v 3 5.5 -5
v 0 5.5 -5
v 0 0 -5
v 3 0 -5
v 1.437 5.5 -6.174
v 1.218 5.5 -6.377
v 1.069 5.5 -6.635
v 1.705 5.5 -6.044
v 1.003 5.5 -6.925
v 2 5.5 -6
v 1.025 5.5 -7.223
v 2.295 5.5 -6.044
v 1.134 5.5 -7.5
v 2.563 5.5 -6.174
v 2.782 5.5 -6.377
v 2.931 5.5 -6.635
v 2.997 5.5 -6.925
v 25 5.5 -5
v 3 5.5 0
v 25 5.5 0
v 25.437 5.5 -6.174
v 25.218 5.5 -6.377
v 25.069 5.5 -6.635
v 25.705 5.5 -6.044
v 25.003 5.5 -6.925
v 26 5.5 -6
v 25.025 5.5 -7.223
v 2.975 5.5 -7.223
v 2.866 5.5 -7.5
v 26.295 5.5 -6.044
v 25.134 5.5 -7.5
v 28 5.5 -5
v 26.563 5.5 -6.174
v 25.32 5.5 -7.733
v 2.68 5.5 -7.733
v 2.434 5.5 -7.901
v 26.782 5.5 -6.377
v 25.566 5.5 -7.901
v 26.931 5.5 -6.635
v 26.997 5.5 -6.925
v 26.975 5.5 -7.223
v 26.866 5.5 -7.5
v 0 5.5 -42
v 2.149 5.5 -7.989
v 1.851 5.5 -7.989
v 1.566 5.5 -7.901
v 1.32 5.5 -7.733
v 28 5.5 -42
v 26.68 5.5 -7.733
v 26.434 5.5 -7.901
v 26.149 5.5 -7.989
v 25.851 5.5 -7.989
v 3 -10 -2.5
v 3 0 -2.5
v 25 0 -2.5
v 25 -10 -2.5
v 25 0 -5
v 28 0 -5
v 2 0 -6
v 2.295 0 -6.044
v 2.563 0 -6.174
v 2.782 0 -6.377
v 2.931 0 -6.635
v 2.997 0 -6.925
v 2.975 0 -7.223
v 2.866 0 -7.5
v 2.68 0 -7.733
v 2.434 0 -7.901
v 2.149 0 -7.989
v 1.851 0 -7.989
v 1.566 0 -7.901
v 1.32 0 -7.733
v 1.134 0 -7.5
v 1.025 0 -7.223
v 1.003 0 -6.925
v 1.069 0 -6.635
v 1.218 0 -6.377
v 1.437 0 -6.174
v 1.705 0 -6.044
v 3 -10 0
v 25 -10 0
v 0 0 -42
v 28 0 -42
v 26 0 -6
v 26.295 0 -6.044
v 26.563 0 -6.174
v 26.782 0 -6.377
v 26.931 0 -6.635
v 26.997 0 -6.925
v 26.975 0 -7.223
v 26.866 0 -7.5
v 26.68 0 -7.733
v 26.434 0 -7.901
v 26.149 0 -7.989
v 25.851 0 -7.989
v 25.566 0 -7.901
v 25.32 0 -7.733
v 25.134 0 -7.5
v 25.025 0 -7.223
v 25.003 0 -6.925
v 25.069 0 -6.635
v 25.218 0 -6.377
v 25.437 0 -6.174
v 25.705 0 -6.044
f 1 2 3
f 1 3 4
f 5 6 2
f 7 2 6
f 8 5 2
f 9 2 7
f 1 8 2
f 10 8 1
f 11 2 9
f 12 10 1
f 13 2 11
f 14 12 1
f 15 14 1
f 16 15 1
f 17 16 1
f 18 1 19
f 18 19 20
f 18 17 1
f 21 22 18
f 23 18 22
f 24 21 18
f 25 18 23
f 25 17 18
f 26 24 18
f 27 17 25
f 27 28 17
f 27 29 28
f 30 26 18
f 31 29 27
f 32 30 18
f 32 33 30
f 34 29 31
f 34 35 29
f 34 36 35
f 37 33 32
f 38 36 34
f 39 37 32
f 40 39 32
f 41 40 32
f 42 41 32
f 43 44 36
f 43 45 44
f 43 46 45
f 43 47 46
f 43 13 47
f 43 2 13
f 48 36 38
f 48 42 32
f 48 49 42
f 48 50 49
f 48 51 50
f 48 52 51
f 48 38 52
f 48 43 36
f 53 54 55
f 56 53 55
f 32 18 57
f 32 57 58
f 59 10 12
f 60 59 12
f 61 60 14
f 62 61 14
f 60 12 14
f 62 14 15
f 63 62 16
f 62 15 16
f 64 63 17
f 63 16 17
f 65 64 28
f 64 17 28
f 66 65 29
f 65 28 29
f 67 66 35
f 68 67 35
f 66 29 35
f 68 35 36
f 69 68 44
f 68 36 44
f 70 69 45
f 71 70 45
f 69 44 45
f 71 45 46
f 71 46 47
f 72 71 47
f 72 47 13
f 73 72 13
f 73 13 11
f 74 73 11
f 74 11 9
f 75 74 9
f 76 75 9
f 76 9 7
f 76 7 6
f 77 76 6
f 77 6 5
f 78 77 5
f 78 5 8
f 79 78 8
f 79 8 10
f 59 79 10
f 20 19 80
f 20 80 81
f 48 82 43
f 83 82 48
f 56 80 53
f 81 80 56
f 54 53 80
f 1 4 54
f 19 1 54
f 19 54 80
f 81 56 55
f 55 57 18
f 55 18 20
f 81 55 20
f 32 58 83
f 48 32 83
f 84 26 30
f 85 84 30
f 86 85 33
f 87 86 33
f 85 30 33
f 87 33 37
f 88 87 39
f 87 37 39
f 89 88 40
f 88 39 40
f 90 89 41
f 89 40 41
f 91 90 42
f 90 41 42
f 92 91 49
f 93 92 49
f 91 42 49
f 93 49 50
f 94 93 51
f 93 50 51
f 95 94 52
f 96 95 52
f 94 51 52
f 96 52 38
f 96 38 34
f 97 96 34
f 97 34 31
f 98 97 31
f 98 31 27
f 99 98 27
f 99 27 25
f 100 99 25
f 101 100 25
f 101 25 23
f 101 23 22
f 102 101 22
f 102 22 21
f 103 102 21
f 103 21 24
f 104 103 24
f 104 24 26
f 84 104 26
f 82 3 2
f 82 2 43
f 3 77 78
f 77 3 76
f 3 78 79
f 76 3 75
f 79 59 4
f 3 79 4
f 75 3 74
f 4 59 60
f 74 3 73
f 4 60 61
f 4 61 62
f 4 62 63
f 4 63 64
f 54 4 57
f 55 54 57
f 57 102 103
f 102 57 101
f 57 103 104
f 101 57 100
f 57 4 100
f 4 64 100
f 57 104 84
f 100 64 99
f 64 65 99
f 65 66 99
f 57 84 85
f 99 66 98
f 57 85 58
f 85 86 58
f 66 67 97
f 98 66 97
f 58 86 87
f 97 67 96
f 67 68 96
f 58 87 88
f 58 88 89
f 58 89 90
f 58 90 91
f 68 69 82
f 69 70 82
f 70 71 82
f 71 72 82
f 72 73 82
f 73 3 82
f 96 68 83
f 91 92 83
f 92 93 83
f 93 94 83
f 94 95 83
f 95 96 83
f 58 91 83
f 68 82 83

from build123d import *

# Parameters (mm, degrees)
SKETCH2_W           = 28
SKETCH2_H           = 42
BOSS_EXTRUDE1_DEPTH = 5.5
SKETCH3_W           = 3
SKETCH3_H           = 5
CUT_EXTRUDE1_DEPTH  = 5.5
SKETCH4_W           = 22
SKETCH4_H           = 2.5
BOSS_EXTRUDE2_DEPTH = 10
SKETCH5_R           = 1
CUT_EXTRUDE2_DEPTH  = 10


with BuildPart() as part:
    # Sketch2 → Boss-Extrude1 (new body)
    with BuildSketch(Plane(origin=(0, 0, 0), x_dir=(1, 0, 0), z_dir=(0, 1, 0))):
        with Locations((14, 21)):
            Rectangle(SKETCH2_W, SKETCH2_H)
    extrude(amount=BOSS_EXTRUDE1_DEPTH)

    # Sketch3 → Cut-Extrude1 (cut)
    with BuildSketch(Plane(origin=(0, 5.5, 0), x_dir=(1, 0, 0), z_dir=(0, 1, 0))):
        with Locations((1.5, 2.5)):
            Rectangle(SKETCH3_W, SKETCH3_H)
        with Locations((26.5, 2.5)):
            Rectangle(SKETCH3_W, SKETCH3_H)
    extrude(amount=-CUT_EXTRUDE1_DEPTH, mode=Mode.SUBTRACT)

    # Sketch4 → Boss-Extrude2 (add)
    with BuildSketch(Plane.XZ):
        with Locations((14, -1.25)):
            Rectangle(SKETCH4_W, SKETCH4_H)
    extrude(amount=BOSS_EXTRUDE2_DEPTH)

    # Sketch5 → Cut-Extrude2 (cut)
    with BuildSketch(Plane(origin=(0, 5.5, 0), x_dir=(1, 0, 0), z_dir=(0, 1, 0))):
        with Locations(Location((2, 7, 0), (0, 0, 270))):
            Circle(SKETCH5_R)
        with Locations(Location((26, 7, 0), (0, 0, 270))):
            Circle(SKETCH5_R)
    extrude(amount=-CUT_EXTRUDE2_DEPTH, mode=Mode.SUBTRACT)


solid = part.part
